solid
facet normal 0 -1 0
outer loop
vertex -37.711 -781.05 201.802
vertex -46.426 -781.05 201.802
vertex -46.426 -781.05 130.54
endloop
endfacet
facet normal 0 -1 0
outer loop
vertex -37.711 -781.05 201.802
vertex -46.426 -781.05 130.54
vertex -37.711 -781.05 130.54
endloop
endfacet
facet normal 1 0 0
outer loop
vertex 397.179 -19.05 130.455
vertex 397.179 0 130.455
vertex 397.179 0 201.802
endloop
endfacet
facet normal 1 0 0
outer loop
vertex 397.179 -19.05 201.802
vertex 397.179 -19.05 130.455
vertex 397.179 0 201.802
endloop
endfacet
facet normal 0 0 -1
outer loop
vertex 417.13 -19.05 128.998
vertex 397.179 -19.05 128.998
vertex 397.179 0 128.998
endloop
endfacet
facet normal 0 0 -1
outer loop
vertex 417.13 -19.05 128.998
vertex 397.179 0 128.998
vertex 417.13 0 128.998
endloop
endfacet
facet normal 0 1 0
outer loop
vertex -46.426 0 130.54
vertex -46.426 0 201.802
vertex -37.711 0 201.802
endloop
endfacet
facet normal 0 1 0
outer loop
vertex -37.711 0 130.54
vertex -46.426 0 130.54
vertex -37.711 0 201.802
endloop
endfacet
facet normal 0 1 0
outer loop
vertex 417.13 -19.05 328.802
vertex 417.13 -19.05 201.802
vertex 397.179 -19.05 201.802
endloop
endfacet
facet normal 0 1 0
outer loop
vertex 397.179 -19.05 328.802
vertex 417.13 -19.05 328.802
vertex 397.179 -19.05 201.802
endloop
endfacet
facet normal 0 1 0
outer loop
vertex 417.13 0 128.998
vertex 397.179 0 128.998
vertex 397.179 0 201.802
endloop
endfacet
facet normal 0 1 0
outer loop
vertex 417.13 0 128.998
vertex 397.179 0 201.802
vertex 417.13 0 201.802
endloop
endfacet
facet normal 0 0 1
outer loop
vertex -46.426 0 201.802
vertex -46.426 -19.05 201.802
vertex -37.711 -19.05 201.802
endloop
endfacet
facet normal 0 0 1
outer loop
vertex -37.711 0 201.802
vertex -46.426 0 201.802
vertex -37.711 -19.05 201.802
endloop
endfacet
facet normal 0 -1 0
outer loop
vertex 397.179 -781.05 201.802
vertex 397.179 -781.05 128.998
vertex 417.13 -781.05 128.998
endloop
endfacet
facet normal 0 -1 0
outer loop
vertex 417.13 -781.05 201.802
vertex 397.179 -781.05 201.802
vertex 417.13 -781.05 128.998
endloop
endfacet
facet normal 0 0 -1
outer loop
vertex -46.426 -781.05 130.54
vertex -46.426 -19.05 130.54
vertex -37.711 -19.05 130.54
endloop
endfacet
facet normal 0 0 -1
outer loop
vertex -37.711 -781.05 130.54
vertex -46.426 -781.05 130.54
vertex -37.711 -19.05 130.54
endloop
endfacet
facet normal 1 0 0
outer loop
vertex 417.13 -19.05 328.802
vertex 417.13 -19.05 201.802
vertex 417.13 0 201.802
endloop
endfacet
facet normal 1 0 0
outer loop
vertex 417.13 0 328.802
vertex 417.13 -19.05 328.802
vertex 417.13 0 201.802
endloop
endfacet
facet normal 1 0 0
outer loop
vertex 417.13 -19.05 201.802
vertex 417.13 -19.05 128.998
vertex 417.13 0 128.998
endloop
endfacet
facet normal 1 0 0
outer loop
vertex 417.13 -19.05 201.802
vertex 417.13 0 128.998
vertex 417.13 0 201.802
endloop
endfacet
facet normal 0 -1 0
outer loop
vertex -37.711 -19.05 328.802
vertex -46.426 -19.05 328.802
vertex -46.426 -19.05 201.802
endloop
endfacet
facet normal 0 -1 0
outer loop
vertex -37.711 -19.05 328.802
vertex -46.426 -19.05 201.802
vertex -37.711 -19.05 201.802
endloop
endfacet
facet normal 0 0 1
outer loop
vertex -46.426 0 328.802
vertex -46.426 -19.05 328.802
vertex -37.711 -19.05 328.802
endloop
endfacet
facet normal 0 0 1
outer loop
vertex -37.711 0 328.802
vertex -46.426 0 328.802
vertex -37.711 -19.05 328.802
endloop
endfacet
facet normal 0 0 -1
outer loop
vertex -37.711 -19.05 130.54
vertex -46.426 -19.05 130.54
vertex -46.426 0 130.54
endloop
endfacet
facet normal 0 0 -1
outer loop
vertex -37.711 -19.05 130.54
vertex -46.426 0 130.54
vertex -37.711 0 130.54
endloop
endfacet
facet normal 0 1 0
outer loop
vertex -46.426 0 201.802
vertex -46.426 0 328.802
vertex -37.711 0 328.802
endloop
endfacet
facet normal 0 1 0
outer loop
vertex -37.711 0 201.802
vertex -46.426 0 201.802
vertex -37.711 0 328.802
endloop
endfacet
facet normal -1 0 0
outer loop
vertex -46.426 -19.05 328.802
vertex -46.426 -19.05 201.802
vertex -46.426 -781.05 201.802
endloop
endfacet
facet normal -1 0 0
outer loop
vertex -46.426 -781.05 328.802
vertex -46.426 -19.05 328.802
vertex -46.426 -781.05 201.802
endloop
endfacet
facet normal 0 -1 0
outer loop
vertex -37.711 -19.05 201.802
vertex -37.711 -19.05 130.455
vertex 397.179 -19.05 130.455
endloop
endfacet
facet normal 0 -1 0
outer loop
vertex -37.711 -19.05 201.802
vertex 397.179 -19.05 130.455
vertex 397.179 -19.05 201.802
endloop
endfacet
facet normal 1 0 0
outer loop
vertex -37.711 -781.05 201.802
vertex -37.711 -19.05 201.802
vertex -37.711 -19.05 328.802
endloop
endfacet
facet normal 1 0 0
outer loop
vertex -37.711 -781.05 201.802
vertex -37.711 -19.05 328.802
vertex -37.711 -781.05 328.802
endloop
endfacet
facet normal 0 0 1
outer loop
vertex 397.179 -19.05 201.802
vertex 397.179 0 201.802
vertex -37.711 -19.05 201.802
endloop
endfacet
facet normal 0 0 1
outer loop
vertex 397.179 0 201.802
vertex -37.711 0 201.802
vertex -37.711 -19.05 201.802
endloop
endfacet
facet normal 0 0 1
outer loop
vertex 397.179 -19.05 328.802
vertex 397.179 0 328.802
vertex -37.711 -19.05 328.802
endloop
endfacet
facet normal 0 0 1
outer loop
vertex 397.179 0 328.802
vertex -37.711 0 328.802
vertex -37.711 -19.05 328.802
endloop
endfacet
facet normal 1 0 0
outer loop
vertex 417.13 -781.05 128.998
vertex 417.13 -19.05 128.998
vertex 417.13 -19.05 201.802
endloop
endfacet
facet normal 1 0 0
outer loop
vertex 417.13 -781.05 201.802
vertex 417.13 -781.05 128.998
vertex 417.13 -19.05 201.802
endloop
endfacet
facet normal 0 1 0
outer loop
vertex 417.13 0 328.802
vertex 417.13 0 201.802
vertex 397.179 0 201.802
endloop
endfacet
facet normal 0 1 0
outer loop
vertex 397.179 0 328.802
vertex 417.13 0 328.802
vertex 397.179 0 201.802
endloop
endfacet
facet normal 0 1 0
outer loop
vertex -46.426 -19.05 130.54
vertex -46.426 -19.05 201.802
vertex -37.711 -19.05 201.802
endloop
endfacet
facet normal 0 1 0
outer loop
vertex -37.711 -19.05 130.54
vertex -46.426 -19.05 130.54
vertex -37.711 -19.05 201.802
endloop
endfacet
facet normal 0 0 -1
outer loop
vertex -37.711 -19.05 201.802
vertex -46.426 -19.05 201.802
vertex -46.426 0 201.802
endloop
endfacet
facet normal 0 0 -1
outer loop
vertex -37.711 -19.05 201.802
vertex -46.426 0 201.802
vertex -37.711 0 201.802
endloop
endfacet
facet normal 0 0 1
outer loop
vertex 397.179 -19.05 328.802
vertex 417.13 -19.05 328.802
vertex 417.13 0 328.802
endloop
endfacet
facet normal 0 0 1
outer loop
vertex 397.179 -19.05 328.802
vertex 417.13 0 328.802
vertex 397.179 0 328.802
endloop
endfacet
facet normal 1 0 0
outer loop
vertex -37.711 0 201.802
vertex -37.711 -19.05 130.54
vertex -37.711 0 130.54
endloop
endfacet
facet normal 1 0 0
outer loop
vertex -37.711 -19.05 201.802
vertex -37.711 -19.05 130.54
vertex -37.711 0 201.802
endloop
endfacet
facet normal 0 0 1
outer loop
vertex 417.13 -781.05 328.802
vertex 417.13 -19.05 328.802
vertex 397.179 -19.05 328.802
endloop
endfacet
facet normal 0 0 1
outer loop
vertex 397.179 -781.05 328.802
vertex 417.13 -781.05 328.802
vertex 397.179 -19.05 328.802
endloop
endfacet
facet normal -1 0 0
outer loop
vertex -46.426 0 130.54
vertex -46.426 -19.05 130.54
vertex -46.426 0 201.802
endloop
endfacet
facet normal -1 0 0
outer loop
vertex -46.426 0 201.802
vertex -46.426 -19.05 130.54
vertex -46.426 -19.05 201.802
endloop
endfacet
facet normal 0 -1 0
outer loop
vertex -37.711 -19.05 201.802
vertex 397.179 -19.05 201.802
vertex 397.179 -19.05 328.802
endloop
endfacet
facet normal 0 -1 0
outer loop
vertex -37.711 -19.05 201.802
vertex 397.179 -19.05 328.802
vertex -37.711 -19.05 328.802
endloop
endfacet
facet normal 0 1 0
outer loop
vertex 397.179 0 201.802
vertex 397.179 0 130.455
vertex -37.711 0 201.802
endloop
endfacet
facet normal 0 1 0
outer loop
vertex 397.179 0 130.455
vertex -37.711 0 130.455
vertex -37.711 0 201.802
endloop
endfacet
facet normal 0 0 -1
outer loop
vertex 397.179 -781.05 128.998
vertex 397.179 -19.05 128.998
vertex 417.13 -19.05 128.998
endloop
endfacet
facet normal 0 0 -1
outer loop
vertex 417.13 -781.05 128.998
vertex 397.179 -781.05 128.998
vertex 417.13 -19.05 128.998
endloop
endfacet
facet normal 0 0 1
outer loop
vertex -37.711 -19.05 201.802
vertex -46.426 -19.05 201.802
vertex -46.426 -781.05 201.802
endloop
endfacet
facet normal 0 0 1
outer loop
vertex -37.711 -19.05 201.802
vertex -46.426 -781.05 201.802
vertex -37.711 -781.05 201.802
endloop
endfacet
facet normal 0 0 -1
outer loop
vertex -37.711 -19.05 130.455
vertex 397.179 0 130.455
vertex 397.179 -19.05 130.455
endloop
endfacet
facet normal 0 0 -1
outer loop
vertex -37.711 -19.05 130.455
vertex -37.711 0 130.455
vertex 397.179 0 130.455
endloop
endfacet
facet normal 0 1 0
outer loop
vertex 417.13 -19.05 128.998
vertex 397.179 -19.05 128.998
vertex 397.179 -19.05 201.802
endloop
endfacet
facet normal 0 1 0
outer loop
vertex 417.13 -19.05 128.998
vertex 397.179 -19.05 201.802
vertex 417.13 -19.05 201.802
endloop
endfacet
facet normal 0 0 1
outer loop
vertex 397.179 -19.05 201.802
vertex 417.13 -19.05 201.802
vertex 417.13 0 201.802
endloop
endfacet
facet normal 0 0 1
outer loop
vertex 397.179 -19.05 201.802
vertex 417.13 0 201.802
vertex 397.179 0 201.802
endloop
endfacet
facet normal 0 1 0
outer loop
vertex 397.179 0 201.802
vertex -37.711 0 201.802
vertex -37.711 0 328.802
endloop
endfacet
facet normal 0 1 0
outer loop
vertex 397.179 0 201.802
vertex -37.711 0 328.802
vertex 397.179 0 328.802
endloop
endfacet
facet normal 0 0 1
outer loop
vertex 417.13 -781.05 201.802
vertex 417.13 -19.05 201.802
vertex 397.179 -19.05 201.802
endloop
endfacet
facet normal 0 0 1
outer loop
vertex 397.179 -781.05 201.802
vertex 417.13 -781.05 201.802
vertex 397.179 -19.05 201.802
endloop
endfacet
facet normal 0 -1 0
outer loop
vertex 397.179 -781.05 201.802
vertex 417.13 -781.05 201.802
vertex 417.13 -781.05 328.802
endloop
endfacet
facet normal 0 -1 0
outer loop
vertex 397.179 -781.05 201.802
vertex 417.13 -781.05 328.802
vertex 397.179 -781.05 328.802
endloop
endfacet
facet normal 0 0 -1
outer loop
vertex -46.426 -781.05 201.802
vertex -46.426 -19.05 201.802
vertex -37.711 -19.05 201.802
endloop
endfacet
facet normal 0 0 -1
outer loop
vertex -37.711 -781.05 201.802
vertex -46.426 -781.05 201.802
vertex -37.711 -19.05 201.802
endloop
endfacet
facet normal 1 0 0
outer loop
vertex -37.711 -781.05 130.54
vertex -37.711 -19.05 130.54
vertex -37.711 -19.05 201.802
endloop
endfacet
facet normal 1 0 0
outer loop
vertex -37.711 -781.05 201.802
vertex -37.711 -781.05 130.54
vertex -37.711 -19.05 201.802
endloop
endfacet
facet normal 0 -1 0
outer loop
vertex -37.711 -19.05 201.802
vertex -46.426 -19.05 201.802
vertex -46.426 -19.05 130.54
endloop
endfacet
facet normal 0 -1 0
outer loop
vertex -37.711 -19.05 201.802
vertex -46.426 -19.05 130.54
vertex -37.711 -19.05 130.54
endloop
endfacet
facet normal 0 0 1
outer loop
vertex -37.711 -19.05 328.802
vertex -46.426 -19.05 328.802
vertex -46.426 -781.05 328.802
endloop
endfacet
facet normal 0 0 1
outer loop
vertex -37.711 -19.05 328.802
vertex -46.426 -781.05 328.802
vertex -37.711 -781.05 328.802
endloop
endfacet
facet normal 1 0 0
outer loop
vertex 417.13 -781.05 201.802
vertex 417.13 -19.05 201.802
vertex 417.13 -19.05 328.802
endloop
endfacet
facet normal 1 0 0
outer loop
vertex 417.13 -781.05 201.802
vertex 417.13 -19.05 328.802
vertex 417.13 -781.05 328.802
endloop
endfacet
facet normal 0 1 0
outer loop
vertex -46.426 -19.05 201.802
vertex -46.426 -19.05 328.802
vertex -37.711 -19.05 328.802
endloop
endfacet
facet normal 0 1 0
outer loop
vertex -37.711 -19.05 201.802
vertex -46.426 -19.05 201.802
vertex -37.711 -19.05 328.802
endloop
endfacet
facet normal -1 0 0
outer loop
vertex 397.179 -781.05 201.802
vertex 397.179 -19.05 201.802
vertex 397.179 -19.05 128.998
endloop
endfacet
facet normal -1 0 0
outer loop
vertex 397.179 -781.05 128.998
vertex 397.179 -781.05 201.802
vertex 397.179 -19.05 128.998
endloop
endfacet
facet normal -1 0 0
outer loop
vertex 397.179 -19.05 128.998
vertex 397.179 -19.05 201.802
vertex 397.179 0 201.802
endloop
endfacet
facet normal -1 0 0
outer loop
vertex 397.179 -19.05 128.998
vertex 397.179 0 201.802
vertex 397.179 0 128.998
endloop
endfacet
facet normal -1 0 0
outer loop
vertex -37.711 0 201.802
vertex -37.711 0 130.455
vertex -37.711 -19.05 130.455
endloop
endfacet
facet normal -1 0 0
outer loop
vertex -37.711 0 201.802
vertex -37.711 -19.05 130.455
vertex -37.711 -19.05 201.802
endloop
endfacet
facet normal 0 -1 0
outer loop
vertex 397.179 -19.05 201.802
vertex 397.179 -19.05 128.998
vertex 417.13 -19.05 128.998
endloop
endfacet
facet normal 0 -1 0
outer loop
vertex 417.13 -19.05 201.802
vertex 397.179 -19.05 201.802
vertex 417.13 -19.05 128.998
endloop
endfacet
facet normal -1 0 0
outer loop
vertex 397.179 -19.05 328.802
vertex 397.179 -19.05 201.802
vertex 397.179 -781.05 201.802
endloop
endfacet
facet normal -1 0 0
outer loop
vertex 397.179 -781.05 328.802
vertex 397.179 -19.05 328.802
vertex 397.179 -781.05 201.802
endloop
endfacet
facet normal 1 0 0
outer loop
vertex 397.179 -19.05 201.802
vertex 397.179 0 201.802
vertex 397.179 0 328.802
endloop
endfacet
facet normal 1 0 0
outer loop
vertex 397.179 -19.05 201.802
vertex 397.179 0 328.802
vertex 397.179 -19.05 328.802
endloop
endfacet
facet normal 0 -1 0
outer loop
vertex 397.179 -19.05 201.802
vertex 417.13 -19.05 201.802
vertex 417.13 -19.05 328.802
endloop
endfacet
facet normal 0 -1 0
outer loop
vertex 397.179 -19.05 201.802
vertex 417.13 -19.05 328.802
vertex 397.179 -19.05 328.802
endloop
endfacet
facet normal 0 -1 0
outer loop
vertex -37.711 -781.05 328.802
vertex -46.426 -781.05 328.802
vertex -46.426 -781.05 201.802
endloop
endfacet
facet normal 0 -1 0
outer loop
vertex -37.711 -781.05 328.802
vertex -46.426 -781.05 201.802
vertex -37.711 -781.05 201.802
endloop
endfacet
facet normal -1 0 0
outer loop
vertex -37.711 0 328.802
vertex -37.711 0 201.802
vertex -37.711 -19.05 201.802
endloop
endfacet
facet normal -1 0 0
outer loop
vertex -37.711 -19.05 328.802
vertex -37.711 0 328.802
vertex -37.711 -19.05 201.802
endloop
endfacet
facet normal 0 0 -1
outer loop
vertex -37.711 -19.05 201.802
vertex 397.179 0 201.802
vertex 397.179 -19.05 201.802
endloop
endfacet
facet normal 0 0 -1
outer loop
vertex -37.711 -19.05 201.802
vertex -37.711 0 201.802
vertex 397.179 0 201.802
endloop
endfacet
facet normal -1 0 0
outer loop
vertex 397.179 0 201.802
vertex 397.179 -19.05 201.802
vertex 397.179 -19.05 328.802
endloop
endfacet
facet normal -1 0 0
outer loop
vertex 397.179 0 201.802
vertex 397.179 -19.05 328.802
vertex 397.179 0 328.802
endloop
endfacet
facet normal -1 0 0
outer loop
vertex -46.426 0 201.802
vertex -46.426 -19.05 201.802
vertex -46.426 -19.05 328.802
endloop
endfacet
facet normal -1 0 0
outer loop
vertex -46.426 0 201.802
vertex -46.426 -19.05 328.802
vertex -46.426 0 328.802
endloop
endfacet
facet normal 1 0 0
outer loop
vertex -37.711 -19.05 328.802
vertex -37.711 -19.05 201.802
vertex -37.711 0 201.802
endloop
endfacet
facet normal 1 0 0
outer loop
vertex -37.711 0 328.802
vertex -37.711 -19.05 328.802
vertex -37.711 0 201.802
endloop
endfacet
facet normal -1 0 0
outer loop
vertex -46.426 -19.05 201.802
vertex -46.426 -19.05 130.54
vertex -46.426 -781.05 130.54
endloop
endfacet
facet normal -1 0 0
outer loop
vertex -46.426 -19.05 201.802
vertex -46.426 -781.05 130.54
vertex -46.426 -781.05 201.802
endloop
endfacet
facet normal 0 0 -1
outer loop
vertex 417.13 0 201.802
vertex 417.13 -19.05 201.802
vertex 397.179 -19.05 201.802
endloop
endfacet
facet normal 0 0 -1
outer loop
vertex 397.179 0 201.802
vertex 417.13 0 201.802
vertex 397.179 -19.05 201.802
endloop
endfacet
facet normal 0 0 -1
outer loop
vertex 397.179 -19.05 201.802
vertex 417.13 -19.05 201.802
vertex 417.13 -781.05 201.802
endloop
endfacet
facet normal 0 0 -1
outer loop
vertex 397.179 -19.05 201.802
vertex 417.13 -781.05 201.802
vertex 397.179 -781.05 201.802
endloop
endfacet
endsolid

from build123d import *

# Parameters (mm, degrees)
F0_W     = 180.8900013566
F0_H     = 71.3479816914
F1_DEPTH = 19.05
F2_W     = 8.7147951126
F2_H     = 71.2627023458
F3_DEPTH = 762
F4_DEPTH = 19.05
F5_DEPTH = 254
F7_DEPTH = 762
F8_DEPTH = 19.05
F9_DEPTH = 127


with BuildPart() as f1:
    # F0 (on Front) → F1 (new body)
    with BuildSketch(Plane.XZ):
        with Locations((52.7335517108, 166.128501296)):
            Rectangle(F0_W, F0_H)
    extrude(amount=F1_DEPTH)

    # F5 (add): a face of the model
    f5_faces = [f1.faces().sort_by_distance(p)[0] for p in [
        (143.1785523891, -9.525, 166.128501296),
    ]]
    extrude(f5_faces, amount=F5_DEPTH)


with BuildPart() as f3:
    # F2 (on face) → F3 (new body)
    with BuildSketch(Plane.XZ.offset(19.05)):
        with Locations((-42.0688465238, 166.1711409688)):
            Rectangle(F2_W, F2_H)
    extrude(amount=F3_DEPTH)


with BuildPart() as f4:
    # F4 (new): a face of the model
    f4_faces = [f3.part.faces().sort_by_distance(p)[0] for p in [
        (-42.0688465238, -19.05, 166.1711409688),
    ]]
    extrude(f4_faces, amount=F4_DEPTH)


with BuildPart() as f7:
    # F6 (on face) → F7 (new body)
    with BuildSketch(Plane.XZ.offset(19.05)):
        Polygon((417.1299636364, 201.8024921417), (397.1785523891, 201.8024921417), (397.1785523891, 130.4545104504), (397.1785523891, 128.9976835251), (417.1299636364, 128.9976835251), align=None)
    extrude(amount=F7_DEPTH)


with BuildPart() as f8:
    # F8 (new): a face of the model
    f8_faces = [f7.part.faces().sort_by_distance(p)[0] for p in [
        (407.1542580128, -19.05, 165.4000878334),
    ]]
    extrude(f8_faces, amount=F8_DEPTH)


with BuildPart() as f9:
    # F9 (new): a face of the model
    f9_faces = [f7.part.faces().sort_by_distance(p)[0] for p in [
        (407.1542580128, -400.05, 201.8024921417),
    ]]
    extrude(f9_faces, amount=F9_DEPTH)


with BuildPart() as f9b:
    # F9#2 (new): a face of the model
    f9_2_faces = [f1.part.faces().sort_by_distance(p)[0] for p in [
        (179.7335517108, -9.525, 201.8024921417),
    ]]
    extrude(f9_2_faces, amount=F9_DEPTH)


with BuildPart() as f9c:
    # F9#3 (new): a face of the model
    f9_3_faces = [f3.part.faces().sort_by_distance(p)[0] for p in [
        (-42.0688465238, -400.05, 201.8024921417),
    ]]
    extrude(f9_3_faces, amount=F9_DEPTH)


with BuildPart() as f9d:
    # F9#4 (new): a face of the model
    f9_4_faces = [f8.part.faces().sort_by_distance(p)[0] for p in [
        (407.1542580128, -9.525, 201.8024921417),
    ]]
    extrude(f9_4_faces, amount=F9_DEPTH)


with BuildPart() as f9e:
    # F9#5 (new): a face of the model
    f9_5_faces = [f4.part.faces().sort_by_distance(p)[0] for p in [
        (-42.0688465238, -9.525, 201.8024921417),
    ]]
    extrude(f9_5_faces, amount=F9_DEPTH)


solid = Compound([f1.part, f3.part, f4.part, f7.part, f8.part, f9.part, f9b.part, f9c.part, f9d.part, f9e.part])
